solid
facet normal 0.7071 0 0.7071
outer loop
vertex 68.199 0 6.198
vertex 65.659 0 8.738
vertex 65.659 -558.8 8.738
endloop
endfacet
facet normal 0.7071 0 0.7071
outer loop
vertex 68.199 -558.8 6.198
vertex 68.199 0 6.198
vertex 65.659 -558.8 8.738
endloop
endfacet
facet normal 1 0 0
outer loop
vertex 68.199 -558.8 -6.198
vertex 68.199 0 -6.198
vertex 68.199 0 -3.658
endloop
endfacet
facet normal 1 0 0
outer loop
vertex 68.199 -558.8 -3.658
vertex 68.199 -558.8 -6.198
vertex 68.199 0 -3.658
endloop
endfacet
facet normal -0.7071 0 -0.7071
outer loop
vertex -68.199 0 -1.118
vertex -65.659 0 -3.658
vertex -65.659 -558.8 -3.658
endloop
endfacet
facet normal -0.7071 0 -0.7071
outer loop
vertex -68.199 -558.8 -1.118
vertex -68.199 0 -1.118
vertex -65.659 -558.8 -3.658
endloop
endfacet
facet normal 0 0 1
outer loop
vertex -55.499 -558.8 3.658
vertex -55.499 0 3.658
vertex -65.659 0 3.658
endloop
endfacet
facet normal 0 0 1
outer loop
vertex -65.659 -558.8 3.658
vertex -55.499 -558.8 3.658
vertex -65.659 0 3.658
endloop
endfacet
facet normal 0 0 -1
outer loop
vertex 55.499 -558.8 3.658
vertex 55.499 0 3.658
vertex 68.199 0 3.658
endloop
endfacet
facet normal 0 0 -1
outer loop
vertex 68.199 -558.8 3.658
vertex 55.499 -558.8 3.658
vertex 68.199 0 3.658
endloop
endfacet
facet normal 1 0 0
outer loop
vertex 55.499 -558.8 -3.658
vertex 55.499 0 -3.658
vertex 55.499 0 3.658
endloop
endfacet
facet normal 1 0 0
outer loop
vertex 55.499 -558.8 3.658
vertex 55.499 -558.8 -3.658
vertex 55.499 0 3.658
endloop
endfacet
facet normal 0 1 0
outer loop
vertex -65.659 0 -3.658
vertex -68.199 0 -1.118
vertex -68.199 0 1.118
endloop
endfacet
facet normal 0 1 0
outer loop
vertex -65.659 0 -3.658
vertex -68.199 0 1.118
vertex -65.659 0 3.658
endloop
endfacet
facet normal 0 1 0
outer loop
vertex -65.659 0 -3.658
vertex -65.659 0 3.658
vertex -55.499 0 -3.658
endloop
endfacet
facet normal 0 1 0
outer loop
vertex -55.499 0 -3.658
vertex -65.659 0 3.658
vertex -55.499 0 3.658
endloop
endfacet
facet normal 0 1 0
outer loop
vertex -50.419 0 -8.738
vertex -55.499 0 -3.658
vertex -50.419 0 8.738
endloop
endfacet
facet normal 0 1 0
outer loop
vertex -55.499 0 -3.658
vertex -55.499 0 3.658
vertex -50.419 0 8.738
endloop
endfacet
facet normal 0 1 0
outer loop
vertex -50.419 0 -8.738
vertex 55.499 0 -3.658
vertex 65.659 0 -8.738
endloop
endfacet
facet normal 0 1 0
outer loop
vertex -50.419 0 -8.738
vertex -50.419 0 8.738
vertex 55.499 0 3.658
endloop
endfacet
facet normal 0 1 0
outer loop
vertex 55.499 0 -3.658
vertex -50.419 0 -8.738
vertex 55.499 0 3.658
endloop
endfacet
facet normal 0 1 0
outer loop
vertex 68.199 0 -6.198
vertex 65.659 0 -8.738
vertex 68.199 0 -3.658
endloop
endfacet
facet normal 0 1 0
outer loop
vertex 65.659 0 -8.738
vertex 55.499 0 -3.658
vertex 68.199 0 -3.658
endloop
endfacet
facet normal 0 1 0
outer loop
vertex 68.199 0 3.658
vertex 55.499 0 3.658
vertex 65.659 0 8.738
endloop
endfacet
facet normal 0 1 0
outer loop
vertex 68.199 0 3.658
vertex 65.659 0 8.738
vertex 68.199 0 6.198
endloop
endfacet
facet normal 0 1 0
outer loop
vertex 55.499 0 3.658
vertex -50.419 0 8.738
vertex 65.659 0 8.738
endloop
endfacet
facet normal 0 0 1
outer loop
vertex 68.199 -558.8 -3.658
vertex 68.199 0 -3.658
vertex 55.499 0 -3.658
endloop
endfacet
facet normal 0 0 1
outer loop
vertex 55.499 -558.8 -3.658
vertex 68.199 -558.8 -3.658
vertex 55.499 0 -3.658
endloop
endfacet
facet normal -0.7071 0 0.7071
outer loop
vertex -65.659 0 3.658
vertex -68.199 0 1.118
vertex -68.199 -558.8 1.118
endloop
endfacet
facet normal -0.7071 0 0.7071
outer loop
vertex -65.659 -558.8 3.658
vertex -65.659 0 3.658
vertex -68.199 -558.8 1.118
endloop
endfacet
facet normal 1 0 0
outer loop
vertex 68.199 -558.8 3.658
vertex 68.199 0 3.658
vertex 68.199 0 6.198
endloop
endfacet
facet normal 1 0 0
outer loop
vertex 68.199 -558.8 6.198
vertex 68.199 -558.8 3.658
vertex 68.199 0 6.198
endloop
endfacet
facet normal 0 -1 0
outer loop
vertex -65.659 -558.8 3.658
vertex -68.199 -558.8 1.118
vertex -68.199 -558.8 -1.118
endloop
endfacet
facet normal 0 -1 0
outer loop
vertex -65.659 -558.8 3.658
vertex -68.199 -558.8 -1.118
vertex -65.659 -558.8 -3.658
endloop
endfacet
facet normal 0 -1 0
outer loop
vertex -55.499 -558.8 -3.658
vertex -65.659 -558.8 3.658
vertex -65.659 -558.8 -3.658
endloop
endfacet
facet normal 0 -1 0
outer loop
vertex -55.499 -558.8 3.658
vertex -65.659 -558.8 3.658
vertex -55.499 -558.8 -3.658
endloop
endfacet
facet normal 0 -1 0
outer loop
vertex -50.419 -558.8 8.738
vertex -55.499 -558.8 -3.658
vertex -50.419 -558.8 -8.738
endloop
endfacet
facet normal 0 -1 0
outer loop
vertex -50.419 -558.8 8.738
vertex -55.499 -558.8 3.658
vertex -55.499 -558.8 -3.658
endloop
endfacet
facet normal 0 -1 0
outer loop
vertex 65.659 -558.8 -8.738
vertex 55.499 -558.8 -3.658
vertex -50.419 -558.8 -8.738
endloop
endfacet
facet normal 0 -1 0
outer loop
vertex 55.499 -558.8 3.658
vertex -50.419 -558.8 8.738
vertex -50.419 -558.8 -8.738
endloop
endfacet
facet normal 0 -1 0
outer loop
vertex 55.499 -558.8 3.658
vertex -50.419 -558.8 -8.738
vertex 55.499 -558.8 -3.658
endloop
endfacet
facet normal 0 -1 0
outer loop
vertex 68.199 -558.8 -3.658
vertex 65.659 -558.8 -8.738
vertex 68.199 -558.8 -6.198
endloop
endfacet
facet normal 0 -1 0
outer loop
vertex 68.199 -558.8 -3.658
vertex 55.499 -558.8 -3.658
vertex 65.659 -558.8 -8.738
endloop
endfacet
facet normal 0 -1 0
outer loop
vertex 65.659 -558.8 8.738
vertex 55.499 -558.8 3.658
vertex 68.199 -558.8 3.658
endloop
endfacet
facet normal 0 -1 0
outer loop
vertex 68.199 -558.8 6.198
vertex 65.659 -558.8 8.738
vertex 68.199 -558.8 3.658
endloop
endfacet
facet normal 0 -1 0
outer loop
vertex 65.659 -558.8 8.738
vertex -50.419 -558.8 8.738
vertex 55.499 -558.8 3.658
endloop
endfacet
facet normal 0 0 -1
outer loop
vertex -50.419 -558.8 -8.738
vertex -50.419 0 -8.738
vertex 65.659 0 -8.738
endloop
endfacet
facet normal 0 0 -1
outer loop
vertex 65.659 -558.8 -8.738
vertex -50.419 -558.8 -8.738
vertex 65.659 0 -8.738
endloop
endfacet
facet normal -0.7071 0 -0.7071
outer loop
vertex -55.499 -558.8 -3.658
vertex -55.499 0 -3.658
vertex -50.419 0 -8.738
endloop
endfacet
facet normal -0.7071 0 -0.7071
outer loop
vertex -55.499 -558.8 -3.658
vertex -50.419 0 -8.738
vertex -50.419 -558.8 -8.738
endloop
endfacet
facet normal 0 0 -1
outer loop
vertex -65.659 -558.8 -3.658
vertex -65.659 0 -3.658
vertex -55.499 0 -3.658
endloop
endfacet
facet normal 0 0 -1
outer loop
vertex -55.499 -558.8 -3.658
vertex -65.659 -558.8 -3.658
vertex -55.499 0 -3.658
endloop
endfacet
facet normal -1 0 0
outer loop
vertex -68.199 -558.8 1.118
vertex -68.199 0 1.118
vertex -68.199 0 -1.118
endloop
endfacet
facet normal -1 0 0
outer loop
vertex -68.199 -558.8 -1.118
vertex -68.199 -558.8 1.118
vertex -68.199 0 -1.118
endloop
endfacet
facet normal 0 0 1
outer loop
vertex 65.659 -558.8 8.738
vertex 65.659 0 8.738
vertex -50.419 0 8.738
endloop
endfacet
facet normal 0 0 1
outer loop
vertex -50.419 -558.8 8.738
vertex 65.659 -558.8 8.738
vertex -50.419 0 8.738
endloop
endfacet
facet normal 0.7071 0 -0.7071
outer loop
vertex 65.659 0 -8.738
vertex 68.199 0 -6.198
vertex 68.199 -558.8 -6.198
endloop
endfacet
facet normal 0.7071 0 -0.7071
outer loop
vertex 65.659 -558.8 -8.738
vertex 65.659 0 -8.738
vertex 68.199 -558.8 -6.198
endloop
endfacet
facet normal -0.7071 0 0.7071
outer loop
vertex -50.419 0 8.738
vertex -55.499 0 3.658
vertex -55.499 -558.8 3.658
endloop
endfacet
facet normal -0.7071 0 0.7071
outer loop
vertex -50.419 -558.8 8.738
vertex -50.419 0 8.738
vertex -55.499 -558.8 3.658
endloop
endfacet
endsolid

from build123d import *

# Parameters (mm, degrees)
F1_DEPTH = 558.8
F2_SIZE  = 2.54
F3_SIZE  = 5.07999


# Not quite as in the source:
# - a fillet or chamfer is up to 0.001 mm smaller than in the source, because OpenCascade refuses the exact size


with BuildPart() as f1:
    # F0 (on Front) → F1 (new body)
    with BuildSketch(Plane.XZ):
        Polygon((68.199, 3.6576), (68.199, 8.7376), (-55.499, 8.7376), (-55.499, 3.6576), (-68.199, 3.6576), (-68.199, -3.6576), (-55.499, -3.6576), (-55.499, -8.7376), (68.199, -8.7376), (68.199, -3.6576), (55.499, -3.6576), (55.499, 3.6576), align=None)
    extrude(amount=F1_DEPTH)

    # F2
    f2_edges = [f1.edges().sort_by_distance(p)[0] for p in [
        (68.199, -279.4, 8.7376),
        (68.199, -279.4, -8.7376),
        (-68.199, -279.4, 3.6576),
        (-68.199, -279.4, -3.6576),
    ]]
    chamfer(f2_edges, length=F2_SIZE)

    # F3 (size 5.08 in the source; OpenCascade refuses exactly that, so slightly less here)
    f3_edges = [f1.edges().sort_by_distance(p)[0] for p in [
        (-55.499, -279.4, 8.7376),
        (-55.499, -279.4, -8.7376),
    ]]
    chamfer(f3_edges, length=F3_SIZE)


solid = f1.part
